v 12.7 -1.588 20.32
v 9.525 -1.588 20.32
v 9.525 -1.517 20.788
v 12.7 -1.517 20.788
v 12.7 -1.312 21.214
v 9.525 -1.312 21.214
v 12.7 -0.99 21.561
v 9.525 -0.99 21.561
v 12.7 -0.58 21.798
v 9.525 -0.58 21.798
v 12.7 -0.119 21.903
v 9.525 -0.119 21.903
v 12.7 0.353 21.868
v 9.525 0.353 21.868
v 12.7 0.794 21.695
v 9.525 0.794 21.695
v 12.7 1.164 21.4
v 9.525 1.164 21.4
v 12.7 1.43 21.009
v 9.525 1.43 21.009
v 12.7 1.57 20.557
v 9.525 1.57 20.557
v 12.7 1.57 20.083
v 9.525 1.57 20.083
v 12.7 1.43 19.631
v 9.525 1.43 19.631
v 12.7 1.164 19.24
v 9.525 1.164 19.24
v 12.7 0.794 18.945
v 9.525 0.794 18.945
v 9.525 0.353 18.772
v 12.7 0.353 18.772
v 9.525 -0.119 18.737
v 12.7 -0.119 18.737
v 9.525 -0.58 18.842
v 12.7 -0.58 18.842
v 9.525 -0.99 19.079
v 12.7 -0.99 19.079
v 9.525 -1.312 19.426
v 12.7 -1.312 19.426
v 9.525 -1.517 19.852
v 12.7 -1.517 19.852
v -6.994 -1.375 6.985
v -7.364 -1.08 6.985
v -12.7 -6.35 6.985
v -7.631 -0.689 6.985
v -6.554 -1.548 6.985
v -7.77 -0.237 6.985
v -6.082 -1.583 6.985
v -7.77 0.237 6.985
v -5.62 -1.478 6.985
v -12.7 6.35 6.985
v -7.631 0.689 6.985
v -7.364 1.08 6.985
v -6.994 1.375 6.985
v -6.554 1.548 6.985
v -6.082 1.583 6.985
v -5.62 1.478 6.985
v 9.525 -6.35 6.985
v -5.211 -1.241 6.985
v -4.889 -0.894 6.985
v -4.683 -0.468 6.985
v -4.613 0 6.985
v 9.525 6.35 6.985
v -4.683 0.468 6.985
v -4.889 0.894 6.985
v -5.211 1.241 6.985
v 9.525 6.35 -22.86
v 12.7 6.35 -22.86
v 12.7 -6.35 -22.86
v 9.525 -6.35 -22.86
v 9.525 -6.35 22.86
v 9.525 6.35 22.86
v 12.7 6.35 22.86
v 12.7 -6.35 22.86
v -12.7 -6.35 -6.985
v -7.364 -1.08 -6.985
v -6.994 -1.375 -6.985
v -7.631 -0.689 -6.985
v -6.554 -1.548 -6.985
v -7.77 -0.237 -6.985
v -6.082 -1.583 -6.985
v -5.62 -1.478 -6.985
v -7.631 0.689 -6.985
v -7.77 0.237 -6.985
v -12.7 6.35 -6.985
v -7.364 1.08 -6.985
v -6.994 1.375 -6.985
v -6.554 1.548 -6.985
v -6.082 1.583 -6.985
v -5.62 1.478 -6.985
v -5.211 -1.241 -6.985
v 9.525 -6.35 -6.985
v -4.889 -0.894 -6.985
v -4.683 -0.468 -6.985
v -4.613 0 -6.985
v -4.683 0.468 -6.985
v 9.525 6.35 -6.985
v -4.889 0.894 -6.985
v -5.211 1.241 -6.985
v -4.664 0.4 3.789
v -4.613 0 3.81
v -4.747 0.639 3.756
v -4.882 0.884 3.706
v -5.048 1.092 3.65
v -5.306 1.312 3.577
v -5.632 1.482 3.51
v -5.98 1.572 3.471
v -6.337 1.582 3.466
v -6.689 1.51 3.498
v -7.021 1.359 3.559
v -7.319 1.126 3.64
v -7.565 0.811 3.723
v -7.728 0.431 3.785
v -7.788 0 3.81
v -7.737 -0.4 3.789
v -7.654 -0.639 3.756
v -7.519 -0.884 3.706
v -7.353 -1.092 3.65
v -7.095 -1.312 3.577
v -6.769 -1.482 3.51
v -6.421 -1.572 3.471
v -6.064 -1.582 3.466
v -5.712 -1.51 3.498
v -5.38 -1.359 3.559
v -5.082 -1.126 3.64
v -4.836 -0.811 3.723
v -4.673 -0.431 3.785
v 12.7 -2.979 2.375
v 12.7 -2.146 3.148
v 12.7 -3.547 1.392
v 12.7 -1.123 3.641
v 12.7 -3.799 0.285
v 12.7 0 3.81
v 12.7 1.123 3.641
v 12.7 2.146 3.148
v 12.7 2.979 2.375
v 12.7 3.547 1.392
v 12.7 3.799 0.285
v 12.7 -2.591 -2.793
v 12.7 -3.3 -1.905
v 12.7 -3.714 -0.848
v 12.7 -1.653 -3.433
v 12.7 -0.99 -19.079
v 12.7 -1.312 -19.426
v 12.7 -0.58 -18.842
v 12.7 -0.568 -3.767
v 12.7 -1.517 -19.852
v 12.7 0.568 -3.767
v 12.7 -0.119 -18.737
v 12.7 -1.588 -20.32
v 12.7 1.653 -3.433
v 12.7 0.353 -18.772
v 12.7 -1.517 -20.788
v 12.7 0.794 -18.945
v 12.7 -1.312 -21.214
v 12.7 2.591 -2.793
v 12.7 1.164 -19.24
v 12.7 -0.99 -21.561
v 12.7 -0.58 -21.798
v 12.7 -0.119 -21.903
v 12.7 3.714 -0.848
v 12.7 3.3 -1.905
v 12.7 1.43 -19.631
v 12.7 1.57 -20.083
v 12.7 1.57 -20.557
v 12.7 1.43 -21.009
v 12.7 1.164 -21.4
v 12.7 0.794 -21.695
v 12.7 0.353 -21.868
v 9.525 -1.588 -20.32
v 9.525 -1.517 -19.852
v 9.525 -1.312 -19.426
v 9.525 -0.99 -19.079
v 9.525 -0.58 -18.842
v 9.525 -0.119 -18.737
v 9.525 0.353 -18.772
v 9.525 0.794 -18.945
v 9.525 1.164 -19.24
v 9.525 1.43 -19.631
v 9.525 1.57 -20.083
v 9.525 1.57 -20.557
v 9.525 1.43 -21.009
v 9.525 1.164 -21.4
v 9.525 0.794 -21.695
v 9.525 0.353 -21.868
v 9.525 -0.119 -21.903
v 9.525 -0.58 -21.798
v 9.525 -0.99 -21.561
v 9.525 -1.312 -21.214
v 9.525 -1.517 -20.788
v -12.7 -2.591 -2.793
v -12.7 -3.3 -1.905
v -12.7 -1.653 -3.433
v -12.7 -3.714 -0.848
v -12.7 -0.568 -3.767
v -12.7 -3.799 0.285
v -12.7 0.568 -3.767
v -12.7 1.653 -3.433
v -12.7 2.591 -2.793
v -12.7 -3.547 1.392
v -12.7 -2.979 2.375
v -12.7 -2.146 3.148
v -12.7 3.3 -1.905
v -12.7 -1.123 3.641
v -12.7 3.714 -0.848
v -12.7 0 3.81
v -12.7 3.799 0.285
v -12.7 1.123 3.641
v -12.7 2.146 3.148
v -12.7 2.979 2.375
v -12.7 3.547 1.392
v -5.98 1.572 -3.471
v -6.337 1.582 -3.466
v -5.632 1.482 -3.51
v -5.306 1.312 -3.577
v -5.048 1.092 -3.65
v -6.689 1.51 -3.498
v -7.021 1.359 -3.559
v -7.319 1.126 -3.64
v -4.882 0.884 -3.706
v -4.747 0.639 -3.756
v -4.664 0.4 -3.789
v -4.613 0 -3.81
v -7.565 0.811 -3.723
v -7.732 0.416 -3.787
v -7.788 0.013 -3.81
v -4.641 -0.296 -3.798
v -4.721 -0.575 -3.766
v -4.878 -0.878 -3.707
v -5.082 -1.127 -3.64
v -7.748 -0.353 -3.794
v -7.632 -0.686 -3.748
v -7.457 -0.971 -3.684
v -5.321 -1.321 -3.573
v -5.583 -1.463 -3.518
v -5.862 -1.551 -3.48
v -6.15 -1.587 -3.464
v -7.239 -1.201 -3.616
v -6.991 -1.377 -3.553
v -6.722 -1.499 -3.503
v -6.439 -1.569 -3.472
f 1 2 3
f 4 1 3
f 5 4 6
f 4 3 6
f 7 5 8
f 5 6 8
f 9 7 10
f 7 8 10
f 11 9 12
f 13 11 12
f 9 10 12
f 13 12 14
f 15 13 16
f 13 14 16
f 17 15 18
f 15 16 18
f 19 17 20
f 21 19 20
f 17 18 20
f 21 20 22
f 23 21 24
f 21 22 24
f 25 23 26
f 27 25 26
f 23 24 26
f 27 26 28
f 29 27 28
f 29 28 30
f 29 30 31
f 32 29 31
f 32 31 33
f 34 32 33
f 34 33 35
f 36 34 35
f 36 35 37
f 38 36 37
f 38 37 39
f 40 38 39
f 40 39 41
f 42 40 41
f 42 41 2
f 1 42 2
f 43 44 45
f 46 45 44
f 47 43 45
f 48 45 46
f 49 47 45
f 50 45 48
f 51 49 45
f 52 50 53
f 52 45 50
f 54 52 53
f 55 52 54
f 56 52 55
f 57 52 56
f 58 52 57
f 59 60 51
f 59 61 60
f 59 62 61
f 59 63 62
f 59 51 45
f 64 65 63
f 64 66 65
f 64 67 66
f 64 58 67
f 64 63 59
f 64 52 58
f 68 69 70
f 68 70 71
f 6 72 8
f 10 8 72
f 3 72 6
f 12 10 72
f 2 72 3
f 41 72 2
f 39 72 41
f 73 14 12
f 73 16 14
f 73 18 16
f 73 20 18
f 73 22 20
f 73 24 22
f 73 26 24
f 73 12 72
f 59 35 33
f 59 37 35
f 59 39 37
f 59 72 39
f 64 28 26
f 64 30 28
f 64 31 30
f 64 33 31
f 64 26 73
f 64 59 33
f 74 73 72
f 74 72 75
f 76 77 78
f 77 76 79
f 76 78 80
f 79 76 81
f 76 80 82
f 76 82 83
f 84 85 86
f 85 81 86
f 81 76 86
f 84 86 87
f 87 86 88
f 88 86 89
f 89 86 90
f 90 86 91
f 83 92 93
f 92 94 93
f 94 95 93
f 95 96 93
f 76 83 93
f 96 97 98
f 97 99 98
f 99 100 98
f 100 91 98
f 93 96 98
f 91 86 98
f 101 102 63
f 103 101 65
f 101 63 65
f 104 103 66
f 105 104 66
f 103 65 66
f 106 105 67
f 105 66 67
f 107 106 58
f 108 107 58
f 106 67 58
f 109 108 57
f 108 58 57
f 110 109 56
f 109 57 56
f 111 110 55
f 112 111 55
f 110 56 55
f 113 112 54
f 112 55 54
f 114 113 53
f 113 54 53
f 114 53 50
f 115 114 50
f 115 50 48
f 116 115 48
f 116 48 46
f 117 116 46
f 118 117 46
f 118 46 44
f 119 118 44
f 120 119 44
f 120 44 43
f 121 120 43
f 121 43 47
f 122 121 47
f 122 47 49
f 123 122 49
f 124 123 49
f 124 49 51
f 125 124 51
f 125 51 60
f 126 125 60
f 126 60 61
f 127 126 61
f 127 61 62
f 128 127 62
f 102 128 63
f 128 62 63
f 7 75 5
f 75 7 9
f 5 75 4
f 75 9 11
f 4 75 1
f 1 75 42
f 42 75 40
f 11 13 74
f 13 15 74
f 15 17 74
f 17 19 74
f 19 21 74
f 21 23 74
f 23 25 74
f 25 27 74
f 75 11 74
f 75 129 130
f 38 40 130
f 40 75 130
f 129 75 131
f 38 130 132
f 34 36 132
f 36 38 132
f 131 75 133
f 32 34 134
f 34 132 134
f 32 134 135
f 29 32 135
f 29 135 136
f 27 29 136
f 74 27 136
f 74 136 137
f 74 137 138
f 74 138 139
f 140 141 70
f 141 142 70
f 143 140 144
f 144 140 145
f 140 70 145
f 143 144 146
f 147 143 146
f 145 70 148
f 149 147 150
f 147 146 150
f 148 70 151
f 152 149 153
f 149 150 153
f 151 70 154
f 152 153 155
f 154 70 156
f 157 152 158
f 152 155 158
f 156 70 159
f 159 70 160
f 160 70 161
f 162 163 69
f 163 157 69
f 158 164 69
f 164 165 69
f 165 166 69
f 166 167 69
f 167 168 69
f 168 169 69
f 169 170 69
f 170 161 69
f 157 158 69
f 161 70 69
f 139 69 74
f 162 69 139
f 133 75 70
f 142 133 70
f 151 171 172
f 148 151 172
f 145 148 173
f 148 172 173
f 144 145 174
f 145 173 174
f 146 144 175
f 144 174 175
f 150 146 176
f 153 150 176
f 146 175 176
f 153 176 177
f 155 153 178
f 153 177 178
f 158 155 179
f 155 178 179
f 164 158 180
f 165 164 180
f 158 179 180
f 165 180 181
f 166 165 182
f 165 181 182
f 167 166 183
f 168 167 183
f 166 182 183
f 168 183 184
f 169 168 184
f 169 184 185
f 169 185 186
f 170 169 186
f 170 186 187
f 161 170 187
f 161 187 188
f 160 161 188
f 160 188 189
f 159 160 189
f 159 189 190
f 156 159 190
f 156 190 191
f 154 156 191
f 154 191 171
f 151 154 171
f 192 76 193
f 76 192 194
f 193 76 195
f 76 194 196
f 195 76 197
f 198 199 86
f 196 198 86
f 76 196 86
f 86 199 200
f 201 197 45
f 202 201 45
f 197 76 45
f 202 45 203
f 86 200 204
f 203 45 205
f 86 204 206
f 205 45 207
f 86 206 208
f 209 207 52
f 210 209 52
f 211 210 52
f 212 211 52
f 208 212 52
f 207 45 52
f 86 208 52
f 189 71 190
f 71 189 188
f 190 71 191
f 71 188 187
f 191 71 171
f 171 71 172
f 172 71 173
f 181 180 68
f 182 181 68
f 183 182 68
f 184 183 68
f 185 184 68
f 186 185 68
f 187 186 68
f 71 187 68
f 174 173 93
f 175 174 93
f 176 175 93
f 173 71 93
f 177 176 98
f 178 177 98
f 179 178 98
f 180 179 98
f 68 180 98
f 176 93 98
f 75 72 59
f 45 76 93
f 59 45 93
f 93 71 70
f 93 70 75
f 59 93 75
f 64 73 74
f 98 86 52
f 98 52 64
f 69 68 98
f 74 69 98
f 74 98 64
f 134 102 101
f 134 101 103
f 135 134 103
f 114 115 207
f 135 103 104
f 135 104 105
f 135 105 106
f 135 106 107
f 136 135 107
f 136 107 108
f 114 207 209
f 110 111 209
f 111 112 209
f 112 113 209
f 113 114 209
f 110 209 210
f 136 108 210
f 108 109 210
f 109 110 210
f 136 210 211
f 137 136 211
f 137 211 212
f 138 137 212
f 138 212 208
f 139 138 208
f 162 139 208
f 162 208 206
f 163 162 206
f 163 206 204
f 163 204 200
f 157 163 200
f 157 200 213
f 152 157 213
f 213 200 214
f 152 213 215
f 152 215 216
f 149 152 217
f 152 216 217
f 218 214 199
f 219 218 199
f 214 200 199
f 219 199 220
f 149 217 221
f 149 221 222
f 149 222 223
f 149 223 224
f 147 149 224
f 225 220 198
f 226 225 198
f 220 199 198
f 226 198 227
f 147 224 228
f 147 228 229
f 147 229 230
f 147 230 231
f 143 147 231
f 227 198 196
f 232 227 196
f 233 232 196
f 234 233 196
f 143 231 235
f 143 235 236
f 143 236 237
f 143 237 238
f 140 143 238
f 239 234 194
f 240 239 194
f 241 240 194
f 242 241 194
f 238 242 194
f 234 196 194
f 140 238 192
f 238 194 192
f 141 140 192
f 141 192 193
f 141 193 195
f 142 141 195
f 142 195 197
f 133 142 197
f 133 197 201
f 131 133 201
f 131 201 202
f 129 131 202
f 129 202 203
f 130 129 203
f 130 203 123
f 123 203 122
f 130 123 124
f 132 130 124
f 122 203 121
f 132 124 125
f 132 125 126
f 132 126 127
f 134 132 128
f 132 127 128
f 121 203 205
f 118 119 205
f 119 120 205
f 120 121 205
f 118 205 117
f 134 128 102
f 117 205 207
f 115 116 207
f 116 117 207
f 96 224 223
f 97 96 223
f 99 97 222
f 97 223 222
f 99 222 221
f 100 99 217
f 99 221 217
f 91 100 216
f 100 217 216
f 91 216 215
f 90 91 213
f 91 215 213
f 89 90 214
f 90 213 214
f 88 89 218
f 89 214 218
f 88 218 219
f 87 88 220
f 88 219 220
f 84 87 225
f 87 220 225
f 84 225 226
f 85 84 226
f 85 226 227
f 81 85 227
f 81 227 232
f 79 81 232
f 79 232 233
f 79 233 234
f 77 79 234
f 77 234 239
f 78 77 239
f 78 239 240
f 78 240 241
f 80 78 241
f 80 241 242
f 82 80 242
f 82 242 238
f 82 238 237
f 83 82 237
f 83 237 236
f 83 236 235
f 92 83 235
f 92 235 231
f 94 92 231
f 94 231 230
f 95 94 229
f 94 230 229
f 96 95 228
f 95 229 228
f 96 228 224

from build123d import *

# Parameters (mm, degrees)
SKETCH1_W           = 25.4
SKETCH1_H           = 12.7
BOSS_EXTRUDE1_DEPTH = 6.985
SKETCH3_W           = 3.175
SKETCH3_H           = 12.7
BOSS_EXTRUDE2_DEPTH = 15.875
SKETCH4_W           = 3.175
SKETCH4_H           = 12.7
BOSS_EXTRUDE3_DEPTH = 15.875
SKETCH5_R           = 1.5875
CUT_EXTRUDE2_DEPTH  = 33.50927137
SKETCH6_R           = 3.81
CUT_EXTRUDE3_DEPTH  = 35.757187746
SKETCH7_R           = 1.5875
CUT_EXTRUDE4_DEPTH  = 34.050514746


with BuildPart() as part:
    # Sketch1 → Boss-Extrude1 (new, symmetric)
    with BuildSketch(Plane.XY):
        Rectangle(SKETCH1_W, SKETCH1_H)
    extrude(amount=BOSS_EXTRUDE1_DEPTH, both=True)

    # Sketch3 → Boss-Extrude2 (add)
    with BuildSketch(Plane(origin=(0, 0, -6.985), x_dir=(-1, 0, 0), z_dir=(0, 0, -1))):
        with Locations((-11.1125, 0)):
            Rectangle(SKETCH3_W, SKETCH3_H)
    extrude(amount=BOSS_EXTRUDE2_DEPTH)

    # Sketch4 → Boss-Extrude3 (add)
    with BuildSketch(Plane.XY.offset(6.985)):
        with Locations((11.1125, 0)):
            Rectangle(SKETCH4_W, SKETCH4_H)
    extrude(amount=BOSS_EXTRUDE3_DEPTH)

    # Sketch5 → Cut-Extrude2 (cut, through all)
    with BuildSketch(Plane.ZY.offset(-9.525)):
        with Locations(Location((-20.32, 0, 0), (0, 0, 270))):
            Circle(SKETCH5_R)
        with Locations(Location((20.32, 0, 0), (0, 0, 270))):
            Circle(SKETCH5_R)
    extrude(amount=-CUT_EXTRUDE2_DEPTH, mode=Mode.SUBTRACT)

    # Sketch6 → Cut-Extrude3 (cut, through all)
    with BuildSketch(Plane.ZY.offset(12.7)):
        Circle(SKETCH6_R)
    extrude(amount=-CUT_EXTRUDE3_DEPTH, mode=Mode.SUBTRACT)

    # Sketch7 → Cut-Extrude4 (cut, through all)
    with BuildSketch(Plane.XY.offset(6.985)):
        with Locations((-6.20047096, 0)):
            Circle(SKETCH7_R)
    extrude(amount=-CUT_EXTRUDE4_DEPTH, mode=Mode.SUBTRACT)


solid = part.part
